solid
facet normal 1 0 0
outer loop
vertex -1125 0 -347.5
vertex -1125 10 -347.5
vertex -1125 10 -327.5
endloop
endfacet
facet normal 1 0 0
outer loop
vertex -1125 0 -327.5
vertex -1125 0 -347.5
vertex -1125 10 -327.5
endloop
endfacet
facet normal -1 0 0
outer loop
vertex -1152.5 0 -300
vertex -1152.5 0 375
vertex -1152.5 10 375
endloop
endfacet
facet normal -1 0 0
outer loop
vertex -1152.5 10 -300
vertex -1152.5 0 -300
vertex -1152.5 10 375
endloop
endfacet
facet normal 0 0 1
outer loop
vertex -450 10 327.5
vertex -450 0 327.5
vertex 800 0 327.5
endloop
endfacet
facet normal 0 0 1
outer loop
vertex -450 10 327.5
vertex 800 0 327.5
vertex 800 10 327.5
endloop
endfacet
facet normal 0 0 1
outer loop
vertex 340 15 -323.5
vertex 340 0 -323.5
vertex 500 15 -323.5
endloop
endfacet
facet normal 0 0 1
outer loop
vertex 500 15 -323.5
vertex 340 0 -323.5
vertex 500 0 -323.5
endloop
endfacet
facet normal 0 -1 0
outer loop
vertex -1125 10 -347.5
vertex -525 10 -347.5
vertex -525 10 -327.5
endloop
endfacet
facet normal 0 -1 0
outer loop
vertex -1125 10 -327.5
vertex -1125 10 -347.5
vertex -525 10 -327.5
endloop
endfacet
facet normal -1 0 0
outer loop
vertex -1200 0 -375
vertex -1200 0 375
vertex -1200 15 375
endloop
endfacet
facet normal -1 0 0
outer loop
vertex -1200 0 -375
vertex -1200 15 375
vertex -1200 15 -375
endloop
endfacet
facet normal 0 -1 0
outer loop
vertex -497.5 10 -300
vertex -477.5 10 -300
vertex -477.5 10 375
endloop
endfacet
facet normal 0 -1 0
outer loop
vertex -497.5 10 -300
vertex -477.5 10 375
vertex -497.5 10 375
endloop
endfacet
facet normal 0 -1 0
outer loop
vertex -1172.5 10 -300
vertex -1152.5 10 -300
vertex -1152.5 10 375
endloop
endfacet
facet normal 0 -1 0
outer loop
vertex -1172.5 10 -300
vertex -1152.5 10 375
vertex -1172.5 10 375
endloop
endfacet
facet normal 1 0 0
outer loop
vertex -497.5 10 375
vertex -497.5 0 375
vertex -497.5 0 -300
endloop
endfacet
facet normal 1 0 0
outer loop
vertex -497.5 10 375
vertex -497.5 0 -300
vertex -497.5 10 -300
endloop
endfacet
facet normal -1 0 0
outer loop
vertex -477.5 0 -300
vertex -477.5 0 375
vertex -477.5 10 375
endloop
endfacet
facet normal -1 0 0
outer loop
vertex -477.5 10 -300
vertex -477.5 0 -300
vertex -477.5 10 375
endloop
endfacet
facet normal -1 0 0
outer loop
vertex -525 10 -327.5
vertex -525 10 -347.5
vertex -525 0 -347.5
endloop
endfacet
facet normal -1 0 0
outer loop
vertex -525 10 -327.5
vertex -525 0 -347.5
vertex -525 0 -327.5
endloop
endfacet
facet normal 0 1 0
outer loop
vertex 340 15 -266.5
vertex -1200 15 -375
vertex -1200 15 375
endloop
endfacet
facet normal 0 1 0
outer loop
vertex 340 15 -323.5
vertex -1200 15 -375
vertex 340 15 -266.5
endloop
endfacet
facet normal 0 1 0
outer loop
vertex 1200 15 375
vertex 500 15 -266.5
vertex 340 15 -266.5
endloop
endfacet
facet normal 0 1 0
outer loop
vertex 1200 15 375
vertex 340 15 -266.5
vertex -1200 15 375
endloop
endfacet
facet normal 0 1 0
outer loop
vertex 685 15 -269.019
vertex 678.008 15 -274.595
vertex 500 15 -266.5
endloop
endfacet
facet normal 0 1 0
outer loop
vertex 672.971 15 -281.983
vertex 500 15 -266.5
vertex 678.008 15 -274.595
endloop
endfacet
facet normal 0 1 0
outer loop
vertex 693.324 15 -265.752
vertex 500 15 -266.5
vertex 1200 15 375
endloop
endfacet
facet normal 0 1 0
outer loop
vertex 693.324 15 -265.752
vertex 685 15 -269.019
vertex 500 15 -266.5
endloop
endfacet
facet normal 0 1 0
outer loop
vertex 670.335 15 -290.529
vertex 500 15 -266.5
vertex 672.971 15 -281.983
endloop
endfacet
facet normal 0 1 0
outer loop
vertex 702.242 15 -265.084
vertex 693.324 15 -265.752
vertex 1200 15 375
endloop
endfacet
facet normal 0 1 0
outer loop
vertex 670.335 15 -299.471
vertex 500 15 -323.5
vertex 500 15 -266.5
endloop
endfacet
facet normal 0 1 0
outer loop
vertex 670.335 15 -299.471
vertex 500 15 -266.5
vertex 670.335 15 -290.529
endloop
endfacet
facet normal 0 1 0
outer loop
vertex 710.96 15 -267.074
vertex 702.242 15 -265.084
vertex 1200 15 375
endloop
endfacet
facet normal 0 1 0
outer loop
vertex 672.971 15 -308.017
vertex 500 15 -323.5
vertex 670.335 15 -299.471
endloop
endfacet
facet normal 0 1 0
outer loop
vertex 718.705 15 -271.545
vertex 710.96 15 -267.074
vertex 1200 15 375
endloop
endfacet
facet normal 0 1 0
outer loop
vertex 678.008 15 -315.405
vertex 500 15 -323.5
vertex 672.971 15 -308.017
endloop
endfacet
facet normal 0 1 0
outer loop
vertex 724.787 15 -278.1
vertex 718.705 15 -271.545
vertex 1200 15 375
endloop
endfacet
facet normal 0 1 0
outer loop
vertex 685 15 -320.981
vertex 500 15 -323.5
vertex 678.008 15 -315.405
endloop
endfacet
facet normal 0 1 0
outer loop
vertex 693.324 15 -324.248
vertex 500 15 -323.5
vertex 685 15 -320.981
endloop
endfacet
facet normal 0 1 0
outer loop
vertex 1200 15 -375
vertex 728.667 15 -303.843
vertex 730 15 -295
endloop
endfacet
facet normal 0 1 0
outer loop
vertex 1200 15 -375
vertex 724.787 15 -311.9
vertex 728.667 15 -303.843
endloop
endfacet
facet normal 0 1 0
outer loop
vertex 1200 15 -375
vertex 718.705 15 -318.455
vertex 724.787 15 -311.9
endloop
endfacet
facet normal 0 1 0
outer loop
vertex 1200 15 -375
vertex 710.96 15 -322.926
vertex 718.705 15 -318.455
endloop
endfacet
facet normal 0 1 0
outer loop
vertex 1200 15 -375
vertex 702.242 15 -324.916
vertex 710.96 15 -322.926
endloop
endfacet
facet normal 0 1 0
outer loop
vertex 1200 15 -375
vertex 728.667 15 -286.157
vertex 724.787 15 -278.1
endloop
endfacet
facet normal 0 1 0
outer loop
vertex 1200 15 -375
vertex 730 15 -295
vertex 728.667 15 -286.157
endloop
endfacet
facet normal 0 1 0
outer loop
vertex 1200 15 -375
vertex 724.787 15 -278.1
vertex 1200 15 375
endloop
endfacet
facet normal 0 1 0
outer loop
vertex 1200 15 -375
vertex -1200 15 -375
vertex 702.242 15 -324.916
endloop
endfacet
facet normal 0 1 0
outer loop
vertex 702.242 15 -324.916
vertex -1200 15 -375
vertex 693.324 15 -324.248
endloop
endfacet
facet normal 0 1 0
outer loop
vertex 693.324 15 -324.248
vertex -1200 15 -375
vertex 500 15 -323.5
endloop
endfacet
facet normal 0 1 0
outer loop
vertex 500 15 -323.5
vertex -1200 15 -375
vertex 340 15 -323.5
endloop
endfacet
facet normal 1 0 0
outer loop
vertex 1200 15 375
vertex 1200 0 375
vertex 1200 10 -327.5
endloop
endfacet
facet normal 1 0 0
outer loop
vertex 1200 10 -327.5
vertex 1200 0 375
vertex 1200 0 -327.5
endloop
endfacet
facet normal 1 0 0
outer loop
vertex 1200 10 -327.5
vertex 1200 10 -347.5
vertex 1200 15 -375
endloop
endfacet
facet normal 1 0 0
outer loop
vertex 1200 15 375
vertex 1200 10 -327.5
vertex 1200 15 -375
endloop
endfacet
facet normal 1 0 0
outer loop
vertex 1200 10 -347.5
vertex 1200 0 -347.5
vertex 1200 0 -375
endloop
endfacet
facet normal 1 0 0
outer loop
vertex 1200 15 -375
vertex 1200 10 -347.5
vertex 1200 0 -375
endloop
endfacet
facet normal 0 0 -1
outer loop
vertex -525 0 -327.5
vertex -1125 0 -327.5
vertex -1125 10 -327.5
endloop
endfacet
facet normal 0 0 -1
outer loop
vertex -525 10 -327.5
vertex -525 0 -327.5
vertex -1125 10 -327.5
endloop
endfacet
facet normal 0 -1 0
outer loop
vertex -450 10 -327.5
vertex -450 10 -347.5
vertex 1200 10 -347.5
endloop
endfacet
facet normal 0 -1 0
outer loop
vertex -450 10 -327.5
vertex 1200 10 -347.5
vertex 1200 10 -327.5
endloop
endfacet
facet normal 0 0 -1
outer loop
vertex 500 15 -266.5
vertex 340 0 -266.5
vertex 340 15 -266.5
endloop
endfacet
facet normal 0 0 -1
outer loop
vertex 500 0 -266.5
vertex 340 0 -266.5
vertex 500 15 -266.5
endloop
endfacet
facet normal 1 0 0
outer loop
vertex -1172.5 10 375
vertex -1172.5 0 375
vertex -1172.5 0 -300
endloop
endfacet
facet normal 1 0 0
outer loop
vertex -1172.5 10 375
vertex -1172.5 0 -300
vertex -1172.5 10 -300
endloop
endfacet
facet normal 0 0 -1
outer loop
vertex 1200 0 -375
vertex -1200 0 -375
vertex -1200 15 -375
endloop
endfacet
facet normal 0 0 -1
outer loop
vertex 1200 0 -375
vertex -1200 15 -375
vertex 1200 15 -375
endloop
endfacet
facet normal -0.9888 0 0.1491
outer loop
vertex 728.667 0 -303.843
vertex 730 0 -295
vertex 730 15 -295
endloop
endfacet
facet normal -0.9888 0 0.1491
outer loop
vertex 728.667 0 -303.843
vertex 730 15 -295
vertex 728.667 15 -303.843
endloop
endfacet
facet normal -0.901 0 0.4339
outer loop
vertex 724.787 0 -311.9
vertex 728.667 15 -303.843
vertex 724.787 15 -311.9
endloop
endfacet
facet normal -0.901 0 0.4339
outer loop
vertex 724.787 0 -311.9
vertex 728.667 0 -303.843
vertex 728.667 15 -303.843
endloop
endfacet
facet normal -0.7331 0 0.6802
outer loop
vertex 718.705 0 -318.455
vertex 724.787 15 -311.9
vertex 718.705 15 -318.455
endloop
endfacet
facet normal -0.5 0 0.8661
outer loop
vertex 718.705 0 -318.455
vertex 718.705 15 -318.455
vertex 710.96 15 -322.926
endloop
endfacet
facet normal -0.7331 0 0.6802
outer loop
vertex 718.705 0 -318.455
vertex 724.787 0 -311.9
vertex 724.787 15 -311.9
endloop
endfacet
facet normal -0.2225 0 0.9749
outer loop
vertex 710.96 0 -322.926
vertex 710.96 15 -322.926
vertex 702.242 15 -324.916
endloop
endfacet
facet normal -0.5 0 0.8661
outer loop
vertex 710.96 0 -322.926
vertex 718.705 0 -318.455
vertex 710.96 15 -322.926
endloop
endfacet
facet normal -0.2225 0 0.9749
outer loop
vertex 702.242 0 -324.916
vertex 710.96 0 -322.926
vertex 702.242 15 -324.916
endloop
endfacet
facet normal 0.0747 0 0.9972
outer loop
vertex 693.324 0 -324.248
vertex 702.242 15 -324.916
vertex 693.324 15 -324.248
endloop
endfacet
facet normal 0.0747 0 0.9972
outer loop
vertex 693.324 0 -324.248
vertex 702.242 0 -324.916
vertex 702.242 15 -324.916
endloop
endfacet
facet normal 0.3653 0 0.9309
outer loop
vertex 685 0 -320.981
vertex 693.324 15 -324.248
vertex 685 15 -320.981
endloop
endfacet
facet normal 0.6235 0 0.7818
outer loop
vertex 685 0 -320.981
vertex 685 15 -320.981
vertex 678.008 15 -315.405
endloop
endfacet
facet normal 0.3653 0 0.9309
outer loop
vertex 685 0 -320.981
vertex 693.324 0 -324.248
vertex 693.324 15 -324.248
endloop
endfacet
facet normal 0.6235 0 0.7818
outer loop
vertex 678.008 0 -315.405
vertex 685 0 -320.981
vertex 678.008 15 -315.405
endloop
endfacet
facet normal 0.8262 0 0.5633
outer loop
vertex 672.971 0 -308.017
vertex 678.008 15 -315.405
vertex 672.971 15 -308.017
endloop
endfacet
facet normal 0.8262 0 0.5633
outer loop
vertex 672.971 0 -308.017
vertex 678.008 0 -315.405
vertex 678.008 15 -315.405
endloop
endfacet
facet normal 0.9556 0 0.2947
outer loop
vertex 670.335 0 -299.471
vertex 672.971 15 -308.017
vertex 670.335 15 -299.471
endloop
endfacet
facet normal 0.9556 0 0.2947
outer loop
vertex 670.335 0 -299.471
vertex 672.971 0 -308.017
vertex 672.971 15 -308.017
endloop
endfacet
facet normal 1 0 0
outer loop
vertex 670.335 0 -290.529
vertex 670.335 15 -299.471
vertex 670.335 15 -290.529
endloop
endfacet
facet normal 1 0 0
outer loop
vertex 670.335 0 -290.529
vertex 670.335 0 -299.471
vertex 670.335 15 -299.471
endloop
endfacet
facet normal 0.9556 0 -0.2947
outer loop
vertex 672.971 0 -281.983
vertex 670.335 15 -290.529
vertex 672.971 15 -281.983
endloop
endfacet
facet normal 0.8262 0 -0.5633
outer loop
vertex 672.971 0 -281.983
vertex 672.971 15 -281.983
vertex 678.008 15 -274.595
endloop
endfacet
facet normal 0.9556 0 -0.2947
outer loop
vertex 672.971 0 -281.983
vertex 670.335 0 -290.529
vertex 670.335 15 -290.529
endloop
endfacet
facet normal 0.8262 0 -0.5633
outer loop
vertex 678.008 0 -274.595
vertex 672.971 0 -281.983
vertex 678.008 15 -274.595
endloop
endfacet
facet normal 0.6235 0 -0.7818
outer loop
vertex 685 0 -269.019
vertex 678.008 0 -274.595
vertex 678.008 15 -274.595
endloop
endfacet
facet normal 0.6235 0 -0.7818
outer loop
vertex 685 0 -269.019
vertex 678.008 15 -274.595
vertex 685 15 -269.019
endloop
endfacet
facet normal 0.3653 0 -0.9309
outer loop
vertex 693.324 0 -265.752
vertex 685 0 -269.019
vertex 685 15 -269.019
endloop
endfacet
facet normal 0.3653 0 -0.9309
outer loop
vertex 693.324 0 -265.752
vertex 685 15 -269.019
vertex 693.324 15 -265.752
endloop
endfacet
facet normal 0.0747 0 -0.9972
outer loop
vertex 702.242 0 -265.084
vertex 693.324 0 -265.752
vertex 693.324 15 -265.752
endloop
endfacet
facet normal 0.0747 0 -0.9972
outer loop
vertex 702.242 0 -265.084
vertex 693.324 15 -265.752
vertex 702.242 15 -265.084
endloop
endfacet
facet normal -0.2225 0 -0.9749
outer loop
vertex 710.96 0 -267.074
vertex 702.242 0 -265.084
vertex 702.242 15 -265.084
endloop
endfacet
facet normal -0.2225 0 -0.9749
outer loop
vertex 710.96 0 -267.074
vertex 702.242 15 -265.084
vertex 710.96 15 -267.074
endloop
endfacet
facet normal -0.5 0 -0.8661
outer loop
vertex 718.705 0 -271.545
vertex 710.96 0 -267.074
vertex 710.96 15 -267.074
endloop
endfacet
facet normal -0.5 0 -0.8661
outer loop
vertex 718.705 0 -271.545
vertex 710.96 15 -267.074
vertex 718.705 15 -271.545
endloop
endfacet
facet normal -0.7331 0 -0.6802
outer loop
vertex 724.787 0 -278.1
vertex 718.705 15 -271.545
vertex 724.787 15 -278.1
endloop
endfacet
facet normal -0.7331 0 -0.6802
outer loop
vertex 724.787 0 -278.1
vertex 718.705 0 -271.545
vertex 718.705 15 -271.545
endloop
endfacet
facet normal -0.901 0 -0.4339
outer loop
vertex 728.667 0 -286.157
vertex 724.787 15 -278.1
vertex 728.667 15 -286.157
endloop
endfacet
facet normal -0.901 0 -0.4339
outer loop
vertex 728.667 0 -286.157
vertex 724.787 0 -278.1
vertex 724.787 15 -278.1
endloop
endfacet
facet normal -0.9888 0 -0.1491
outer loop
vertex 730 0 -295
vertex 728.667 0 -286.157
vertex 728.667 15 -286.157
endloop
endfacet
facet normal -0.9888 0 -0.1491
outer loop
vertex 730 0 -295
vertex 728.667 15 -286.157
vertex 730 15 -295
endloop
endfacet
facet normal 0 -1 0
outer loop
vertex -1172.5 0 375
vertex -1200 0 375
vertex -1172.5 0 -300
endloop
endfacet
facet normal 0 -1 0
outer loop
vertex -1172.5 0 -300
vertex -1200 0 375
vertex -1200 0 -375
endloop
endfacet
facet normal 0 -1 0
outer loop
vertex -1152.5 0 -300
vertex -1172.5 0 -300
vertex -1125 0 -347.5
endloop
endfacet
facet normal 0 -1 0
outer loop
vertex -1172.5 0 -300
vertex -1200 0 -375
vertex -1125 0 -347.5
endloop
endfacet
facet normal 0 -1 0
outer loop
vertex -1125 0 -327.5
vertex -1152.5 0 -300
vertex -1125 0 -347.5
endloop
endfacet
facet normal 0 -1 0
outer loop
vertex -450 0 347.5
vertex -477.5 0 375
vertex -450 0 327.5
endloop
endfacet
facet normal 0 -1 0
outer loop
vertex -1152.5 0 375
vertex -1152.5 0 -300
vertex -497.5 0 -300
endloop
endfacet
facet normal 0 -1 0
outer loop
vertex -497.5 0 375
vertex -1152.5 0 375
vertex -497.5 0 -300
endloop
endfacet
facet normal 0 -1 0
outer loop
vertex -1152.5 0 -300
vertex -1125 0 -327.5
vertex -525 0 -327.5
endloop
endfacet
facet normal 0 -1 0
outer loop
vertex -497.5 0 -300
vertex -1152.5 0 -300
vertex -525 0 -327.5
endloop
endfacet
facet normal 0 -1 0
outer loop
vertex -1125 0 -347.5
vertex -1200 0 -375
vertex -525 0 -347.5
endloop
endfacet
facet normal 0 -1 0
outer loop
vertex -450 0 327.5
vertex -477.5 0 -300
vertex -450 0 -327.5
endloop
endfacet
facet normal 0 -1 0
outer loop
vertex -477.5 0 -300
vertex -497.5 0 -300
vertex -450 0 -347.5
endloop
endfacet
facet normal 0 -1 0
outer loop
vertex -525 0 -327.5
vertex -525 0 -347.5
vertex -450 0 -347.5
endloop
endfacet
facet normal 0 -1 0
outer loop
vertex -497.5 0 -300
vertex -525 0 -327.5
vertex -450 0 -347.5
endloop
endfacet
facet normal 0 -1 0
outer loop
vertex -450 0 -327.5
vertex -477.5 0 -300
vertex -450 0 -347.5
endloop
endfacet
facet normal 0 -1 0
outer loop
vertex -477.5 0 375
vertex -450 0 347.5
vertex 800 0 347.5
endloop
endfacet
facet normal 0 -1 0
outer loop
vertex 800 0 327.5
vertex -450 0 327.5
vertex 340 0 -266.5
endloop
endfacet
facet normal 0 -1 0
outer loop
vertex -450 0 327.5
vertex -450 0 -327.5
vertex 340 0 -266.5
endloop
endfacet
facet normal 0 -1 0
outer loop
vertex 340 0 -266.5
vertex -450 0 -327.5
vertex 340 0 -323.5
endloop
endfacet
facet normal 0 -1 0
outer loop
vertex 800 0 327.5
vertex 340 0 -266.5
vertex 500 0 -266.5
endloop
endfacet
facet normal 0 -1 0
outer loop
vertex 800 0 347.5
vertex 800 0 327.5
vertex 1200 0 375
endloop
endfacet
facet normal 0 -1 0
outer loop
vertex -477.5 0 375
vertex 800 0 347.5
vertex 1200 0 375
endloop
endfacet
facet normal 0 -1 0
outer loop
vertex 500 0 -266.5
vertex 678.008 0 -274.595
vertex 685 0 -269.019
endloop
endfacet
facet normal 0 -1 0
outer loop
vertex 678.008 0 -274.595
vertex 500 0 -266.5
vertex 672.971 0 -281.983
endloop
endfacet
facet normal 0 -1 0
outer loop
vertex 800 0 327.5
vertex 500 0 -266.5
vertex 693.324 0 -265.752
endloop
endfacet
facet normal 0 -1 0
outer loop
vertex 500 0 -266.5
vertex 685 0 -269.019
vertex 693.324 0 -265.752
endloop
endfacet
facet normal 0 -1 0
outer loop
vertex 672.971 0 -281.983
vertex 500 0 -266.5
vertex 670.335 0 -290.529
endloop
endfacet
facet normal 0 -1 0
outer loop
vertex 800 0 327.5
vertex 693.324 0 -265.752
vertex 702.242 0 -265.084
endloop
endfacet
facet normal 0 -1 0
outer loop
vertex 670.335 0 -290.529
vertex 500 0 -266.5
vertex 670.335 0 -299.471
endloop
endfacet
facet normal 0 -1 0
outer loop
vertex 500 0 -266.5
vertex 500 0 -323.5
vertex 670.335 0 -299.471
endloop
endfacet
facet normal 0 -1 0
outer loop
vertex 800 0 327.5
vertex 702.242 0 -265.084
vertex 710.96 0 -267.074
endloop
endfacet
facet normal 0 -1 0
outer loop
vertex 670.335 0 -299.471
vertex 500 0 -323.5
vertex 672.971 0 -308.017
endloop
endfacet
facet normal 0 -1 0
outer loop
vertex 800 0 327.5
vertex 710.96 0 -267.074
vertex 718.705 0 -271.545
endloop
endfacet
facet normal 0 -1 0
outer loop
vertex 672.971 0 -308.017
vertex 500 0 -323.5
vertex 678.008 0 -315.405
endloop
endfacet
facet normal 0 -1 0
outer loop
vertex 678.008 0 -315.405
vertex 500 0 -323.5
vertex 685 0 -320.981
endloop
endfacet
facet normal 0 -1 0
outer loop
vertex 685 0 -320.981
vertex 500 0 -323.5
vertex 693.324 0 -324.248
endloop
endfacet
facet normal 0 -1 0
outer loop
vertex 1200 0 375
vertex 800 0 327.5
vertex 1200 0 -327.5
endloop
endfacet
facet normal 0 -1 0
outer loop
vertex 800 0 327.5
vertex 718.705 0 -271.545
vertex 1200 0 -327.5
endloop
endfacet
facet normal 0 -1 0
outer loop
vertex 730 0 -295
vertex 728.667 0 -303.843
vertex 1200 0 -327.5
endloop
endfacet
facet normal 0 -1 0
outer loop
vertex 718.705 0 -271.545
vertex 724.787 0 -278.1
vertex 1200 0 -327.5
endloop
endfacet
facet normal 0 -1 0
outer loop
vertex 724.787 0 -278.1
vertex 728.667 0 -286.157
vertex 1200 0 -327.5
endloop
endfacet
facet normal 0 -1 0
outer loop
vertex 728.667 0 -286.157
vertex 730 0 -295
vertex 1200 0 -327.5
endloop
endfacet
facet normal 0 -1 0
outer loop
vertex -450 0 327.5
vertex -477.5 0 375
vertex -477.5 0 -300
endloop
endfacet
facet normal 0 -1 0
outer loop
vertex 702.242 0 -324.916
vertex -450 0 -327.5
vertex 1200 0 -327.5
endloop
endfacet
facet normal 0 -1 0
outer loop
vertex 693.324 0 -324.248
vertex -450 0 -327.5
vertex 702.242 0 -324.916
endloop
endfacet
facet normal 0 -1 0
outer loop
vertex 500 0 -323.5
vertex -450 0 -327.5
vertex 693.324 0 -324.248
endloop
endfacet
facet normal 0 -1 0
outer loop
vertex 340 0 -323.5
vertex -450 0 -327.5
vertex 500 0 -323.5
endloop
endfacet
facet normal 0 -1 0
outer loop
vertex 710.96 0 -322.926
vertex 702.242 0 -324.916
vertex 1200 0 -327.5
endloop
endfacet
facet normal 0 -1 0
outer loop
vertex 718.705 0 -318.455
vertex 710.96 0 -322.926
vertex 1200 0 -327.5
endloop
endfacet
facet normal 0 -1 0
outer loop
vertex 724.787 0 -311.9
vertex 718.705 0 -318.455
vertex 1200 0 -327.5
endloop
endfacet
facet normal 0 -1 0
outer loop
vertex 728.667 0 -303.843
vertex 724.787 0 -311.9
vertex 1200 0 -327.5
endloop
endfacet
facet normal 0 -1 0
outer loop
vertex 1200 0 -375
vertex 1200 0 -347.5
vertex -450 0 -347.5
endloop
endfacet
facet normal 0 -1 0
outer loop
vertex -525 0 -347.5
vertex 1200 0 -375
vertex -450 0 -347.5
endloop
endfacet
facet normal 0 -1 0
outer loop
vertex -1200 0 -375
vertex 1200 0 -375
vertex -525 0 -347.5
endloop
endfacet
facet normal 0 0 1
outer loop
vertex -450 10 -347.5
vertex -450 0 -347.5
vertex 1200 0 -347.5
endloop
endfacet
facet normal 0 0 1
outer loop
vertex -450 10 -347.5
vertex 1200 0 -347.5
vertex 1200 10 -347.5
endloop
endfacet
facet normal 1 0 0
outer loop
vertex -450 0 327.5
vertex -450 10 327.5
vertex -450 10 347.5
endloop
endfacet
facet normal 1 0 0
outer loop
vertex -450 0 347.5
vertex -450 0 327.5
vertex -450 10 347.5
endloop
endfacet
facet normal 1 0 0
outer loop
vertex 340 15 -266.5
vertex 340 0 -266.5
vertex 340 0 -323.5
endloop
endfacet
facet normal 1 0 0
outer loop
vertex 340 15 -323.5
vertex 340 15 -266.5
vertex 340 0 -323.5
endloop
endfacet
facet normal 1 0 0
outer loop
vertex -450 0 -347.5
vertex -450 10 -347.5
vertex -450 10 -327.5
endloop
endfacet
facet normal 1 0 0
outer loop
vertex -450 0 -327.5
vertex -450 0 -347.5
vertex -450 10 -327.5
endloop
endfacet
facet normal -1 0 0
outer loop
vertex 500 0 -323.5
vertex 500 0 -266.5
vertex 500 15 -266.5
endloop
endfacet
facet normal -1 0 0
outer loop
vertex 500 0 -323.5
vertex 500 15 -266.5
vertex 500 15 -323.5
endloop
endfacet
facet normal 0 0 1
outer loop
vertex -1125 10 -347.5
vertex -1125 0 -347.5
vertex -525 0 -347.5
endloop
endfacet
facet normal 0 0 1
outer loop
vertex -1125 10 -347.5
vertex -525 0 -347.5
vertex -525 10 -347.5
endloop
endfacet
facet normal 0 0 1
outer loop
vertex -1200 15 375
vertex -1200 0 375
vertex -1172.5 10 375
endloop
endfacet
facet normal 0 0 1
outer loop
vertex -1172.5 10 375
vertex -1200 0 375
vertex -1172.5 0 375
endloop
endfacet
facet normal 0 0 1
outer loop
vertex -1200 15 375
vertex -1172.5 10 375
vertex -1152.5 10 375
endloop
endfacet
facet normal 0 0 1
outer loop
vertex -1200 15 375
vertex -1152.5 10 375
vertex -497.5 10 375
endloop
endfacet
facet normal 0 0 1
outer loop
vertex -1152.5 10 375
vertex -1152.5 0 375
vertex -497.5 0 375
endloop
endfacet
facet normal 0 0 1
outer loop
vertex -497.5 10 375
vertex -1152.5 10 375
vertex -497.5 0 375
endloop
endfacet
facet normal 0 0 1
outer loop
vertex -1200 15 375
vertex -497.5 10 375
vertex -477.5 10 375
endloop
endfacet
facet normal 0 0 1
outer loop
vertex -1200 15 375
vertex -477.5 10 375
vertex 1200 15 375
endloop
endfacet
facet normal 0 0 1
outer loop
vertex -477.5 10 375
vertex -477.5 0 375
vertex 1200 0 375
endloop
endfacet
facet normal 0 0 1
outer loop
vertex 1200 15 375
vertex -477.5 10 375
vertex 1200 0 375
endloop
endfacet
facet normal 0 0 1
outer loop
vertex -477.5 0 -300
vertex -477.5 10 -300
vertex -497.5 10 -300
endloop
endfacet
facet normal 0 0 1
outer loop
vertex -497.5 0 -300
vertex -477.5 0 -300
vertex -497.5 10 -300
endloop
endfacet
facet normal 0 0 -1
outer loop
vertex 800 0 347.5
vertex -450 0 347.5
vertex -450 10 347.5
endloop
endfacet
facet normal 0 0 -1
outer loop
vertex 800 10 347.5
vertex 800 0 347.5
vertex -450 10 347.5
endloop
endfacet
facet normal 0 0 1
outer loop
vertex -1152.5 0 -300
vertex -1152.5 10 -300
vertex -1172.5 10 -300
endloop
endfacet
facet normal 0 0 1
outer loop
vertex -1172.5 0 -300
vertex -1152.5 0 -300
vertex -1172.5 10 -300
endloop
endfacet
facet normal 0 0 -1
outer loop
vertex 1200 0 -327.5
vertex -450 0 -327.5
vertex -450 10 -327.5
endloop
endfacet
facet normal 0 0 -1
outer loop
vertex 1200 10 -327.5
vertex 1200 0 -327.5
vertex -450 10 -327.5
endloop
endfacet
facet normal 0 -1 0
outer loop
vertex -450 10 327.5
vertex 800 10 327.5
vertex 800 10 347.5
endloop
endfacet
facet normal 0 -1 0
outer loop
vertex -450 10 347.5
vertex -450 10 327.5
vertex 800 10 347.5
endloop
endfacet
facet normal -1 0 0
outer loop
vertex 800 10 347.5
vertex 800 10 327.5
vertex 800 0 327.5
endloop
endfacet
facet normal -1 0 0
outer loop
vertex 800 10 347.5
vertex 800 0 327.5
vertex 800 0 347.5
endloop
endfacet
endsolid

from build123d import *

# Parameters (mm, degrees)
SKETCH1_W           = 2400
SKETCH1_H           = 750
SKETCH1_R           = 30
SKETCH1_W_2         = 160
SKETCH1_H_2         = 57
BOSS_EXTRUDE1_DEPTH = 15
CUT_EXTRUDE1_START  = -75
SKETCH3_W           = 20
SKETCH3_H           = 10
CUT_EXTRUDE1_DEPTH  = 676
CUT_EXTRUDE2_START  = -675
SKETCH4_W           = 20
SKETCH4_H           = 10
CUT_EXTRUDE2_DEPTH  = 600
CUT_EXTRUDE3_START  = -2400
SKETCH4_4_W         = 20
SKETCH4_4_H         = 10
CUT_EXTRUDE3_DEPTH  = 1650
CUT_EXTRUDE4_START  = -2000
SKETCH4_5_W         = 20
SKETCH4_5_H         = 10
CUT_EXTRUDE4_DEPTH  = 1250


with BuildPart() as part:
    # Sketch1 → Boss-Extrude1 (new body)
    with BuildSketch(Plane(origin=(0, 0, 0), x_dir=(1, 0, 0), z_dir=(0, 1, 0))):
        Rectangle(SKETCH1_W, SKETCH1_H)
        with Locations((700, 295)):
            Circle(SKETCH1_R, mode=Mode.SUBTRACT)
        with Locations((420, 295)):
            Rectangle(SKETCH1_W_2, SKETCH1_H_2, mode=Mode.SUBTRACT)
    extrude(amount=BOSS_EXTRUDE1_DEPTH)

    # Sketch3 → Cut-Extrude1 (cut, through all)
    with BuildSketch(Plane(origin=(0, 0, -375), x_dir=(-1, 0, 0), z_dir=(0, 0, -1)).offset(CUT_EXTRUDE1_START)):
        with Locations((1162.5, 5)):
            Rectangle(SKETCH3_W, SKETCH3_H)
        with Locations((487.5, 5)):
            Rectangle(SKETCH3_W, SKETCH3_H)
    extrude(amount=-CUT_EXTRUDE1_DEPTH, mode=Mode.SUBTRACT)

    # Sketch4 → Cut-Extrude2 (cut)
    with BuildSketch(Plane.ZY.offset(1200).offset(CUT_EXTRUDE2_START)):
        with Locations((-337.5, 5)):
            Rectangle(SKETCH4_W, SKETCH4_H)
    extrude(amount=CUT_EXTRUDE2_DEPTH, mode=Mode.SUBTRACT)

    # Sketch4<4> → Cut-Extrude3 (cut)
    with BuildSketch(Plane.ZY.offset(1200).offset(CUT_EXTRUDE3_START)):
        with Locations((-337.5, 5)):
            Rectangle(SKETCH4_4_W, SKETCH4_4_H)
    extrude(amount=CUT_EXTRUDE3_DEPTH, mode=Mode.SUBTRACT)

    # Sketch4<5> → Cut-Extrude4 (cut)
    with BuildSketch(Plane.ZY.offset(1200).offset(CUT_EXTRUDE4_START)):
        with Locations((337.5, 5)):
            Rectangle(SKETCH4_5_W, SKETCH4_5_H)
    extrude(amount=CUT_EXTRUDE4_DEPTH, mode=Mode.SUBTRACT)


solid = part.part
